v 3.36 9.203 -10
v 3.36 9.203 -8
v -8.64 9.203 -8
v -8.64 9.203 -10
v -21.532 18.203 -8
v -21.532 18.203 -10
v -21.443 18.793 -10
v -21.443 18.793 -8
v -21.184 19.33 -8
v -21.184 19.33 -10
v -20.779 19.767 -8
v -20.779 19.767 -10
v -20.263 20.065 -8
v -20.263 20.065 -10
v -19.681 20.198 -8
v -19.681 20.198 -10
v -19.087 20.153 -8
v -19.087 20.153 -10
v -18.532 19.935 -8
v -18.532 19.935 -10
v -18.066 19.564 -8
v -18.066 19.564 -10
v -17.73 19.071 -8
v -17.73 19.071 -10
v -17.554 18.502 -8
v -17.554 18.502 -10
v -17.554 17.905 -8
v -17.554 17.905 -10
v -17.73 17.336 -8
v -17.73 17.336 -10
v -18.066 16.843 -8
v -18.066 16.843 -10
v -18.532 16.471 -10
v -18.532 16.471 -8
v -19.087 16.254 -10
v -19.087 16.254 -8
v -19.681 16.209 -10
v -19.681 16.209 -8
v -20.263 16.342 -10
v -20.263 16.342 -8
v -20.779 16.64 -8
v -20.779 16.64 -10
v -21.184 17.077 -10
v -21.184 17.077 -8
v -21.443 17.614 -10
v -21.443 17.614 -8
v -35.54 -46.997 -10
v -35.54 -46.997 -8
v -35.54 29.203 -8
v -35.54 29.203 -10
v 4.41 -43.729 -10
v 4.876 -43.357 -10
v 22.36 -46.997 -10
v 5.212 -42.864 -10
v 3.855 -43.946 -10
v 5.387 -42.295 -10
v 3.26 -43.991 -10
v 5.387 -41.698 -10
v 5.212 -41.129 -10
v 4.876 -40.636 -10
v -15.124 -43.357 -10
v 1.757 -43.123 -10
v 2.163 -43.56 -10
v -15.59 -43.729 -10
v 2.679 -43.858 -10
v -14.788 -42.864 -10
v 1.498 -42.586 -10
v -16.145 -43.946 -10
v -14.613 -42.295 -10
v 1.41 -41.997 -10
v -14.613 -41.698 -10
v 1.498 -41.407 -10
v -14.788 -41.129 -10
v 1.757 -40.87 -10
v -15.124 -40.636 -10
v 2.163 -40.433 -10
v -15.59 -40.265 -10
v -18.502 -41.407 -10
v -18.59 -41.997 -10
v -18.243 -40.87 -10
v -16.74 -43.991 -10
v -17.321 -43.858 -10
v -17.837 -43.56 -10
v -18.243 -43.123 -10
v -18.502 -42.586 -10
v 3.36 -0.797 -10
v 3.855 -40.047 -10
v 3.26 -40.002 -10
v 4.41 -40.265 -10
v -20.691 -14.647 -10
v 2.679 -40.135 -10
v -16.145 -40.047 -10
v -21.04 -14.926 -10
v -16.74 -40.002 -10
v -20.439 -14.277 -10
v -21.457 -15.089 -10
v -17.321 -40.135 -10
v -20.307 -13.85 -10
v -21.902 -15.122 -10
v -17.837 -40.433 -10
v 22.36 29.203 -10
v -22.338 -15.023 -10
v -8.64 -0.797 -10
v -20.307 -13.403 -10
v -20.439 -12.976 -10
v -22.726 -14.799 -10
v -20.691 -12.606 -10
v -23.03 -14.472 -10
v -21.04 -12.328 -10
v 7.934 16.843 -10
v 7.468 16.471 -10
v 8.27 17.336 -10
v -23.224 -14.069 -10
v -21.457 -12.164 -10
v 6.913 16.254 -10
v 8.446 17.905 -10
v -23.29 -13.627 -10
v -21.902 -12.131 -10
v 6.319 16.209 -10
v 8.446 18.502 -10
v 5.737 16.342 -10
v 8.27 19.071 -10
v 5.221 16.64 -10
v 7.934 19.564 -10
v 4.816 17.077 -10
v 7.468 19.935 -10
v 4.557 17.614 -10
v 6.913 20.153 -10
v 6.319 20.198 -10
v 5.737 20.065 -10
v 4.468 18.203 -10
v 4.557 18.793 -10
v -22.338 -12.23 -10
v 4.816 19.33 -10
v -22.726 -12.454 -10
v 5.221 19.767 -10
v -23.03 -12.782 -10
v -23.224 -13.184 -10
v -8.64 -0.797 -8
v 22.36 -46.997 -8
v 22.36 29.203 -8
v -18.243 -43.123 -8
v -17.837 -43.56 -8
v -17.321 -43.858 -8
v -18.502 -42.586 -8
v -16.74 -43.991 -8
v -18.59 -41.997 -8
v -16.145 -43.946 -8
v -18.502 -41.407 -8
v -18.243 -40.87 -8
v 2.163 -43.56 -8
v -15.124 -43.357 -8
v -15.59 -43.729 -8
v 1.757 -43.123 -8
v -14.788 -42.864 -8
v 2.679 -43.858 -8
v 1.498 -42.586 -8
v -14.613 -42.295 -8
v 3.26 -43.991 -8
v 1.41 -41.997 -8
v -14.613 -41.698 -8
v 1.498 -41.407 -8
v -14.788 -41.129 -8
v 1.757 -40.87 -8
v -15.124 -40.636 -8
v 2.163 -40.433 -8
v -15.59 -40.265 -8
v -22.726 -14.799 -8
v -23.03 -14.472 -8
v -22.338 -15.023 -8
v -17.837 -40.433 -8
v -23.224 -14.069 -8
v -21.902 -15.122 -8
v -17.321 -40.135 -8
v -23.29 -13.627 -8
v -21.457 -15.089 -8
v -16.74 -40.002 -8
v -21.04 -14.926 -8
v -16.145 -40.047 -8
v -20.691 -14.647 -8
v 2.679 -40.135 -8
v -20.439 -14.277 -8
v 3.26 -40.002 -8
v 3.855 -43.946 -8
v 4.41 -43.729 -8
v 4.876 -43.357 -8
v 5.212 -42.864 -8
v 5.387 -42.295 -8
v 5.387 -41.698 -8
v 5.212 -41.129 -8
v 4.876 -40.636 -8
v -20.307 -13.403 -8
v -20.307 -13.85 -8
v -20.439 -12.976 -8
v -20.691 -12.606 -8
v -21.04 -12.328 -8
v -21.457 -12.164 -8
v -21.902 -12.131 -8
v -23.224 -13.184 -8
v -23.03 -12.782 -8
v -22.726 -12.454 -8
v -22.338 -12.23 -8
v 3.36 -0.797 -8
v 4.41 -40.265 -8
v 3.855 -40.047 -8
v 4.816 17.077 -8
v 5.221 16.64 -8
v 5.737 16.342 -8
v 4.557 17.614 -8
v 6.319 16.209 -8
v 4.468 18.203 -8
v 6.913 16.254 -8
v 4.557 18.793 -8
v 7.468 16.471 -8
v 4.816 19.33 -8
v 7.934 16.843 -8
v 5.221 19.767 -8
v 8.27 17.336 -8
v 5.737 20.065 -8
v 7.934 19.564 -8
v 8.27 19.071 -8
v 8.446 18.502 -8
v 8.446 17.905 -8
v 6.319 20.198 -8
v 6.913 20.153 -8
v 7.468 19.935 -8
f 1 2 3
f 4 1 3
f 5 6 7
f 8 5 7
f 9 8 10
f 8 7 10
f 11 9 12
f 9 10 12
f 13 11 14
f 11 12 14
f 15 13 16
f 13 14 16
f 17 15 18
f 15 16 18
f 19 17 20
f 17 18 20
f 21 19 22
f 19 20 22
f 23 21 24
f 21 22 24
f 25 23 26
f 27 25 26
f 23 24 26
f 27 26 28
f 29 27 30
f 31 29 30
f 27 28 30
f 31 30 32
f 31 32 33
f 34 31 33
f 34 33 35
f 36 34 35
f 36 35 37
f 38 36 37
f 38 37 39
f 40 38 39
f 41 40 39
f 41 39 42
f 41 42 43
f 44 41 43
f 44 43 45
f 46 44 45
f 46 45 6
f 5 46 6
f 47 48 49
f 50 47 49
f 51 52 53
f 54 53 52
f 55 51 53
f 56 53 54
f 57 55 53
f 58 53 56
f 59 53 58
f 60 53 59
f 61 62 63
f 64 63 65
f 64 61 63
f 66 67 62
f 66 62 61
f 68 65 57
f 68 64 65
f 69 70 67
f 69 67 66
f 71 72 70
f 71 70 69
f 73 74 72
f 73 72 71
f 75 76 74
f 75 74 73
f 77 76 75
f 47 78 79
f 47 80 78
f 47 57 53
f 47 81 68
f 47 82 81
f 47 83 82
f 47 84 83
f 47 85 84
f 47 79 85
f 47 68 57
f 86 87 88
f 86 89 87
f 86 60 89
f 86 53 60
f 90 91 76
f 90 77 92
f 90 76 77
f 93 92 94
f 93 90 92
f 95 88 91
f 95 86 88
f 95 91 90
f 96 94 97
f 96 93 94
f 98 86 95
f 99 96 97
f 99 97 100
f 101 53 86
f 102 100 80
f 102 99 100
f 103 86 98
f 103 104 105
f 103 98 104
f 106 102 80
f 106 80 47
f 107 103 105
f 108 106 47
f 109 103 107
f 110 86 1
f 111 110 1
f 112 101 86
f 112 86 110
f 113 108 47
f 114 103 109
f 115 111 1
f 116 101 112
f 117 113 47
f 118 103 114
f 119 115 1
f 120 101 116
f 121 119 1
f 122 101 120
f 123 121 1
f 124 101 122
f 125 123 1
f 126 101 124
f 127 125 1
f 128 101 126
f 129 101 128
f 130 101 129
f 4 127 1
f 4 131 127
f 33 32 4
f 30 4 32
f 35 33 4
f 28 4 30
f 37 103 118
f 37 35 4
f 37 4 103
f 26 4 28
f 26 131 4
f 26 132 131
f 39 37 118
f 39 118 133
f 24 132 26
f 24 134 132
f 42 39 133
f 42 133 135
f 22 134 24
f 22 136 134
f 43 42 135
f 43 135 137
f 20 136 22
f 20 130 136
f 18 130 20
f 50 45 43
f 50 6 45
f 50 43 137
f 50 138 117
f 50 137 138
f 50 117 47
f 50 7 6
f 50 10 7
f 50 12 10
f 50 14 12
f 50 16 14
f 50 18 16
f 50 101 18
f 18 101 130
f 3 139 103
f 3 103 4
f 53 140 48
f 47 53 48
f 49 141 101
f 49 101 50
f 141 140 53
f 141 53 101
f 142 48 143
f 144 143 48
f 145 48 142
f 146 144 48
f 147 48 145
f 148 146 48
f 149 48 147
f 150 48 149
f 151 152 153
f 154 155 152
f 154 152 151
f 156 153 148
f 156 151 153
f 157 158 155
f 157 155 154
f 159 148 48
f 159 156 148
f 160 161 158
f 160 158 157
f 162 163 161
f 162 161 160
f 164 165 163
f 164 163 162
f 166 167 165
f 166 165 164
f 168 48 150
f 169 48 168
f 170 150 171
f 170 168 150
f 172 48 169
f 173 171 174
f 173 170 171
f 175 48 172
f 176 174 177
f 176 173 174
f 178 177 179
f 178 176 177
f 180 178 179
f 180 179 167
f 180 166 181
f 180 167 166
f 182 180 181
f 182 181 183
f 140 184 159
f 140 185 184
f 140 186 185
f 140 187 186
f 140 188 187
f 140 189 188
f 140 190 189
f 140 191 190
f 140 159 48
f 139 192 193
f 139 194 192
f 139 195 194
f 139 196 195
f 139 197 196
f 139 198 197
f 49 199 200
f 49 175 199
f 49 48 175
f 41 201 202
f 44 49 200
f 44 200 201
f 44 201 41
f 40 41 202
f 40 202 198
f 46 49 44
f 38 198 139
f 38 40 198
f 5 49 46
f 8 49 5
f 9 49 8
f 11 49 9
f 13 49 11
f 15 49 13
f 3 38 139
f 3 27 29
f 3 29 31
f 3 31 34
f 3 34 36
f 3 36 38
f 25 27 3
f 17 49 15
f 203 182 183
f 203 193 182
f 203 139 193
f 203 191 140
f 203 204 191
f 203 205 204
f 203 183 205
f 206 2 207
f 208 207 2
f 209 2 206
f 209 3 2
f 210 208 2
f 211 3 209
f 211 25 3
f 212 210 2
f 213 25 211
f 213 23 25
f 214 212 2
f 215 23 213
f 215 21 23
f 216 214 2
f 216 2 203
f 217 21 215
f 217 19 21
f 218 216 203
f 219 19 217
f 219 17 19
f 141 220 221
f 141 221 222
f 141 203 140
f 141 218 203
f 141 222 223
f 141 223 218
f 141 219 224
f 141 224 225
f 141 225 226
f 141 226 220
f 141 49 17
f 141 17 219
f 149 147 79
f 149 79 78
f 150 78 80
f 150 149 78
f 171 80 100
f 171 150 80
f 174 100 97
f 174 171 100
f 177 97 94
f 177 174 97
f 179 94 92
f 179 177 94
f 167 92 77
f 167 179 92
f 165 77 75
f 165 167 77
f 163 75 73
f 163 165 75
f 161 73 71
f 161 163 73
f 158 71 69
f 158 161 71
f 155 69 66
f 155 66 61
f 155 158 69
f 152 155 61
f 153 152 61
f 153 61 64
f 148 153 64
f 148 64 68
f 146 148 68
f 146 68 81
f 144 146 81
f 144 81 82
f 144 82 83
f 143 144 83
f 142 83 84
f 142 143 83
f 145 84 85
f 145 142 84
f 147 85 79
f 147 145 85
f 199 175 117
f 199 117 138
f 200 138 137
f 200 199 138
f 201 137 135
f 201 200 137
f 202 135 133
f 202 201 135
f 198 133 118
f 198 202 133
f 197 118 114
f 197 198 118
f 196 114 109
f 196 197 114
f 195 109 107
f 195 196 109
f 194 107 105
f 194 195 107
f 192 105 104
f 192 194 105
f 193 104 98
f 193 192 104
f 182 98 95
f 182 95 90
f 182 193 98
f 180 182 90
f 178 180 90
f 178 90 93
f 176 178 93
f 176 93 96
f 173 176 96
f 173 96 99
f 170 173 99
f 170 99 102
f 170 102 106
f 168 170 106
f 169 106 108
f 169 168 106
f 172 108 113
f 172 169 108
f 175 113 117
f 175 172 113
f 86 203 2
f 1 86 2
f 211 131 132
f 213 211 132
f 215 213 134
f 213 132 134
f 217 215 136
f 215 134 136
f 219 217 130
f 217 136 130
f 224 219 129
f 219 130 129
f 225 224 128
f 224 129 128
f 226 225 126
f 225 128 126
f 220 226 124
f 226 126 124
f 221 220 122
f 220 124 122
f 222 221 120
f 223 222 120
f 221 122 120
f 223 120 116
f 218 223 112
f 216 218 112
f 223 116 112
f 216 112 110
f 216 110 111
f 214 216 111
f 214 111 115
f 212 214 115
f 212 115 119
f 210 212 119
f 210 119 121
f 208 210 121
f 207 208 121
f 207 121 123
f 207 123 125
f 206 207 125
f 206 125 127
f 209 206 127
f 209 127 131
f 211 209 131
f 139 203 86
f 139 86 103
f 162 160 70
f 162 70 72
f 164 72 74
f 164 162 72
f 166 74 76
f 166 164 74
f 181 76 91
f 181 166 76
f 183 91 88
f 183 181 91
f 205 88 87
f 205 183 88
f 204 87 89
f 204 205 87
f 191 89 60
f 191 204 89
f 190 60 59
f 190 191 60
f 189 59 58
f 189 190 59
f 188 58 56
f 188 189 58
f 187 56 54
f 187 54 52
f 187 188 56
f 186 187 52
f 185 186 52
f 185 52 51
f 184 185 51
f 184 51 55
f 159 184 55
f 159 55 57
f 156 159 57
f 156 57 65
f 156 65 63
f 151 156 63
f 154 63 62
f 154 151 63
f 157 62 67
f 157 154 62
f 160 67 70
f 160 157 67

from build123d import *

# Parameters (mm, degrees)
SKETCH1_W           = 57.9
SKETCH1_H           = 76.2
BOSS_EXTRUDE1_DEPTH = 2
SKETCH2_R           = 2
SKETCH2_W           = 12
SKETCH2_H           = 10
SKETCH2_R_2         = 1.5
CUT_EXTRUDE1_DEPTH  = 2
SKETCH4_R           = 2
SKETCH4_R_2         = 1.5
SKETCH4_R_3         = 1.957178151
BOSS_EXTRUDE5_DEPTH = 2
SKETCH8_W           = 57.9
SKETCH8_H           = 76.2
SKETCH8_R           = 2
SKETCH8_R_2         = 1.5
SKETCH8_W_2         = 12
SKETCH8_H_2         = 10
BOSS_EXTRUDE6_DEPTH = 10
SKETCH9_R           = 2
CUT_EXTRUDE6_DEPTH  = 10
SKETCH10_W          = 57.9
SKETCH10_H          = 76.2
CUT_EXTRUDE7_DEPTH  = 10


with BuildPart() as part:
    # Sketch1 → Boss-Extrude1 (new body)
    with BuildSketch(Plane.XY):
        with Locations((-6.590392234, -8.896581688)):
            Rectangle(SKETCH1_W, SKETCH1_H)
    extrude(amount=BOSS_EXTRUDE1_DEPTH)

    # Sketch2 → Cut-Extrude1 (cut)
    with BuildSketch(Plane(origin=(0, 0, 0), x_dir=(-1, 0, 0), z_dir=(0, 0, -1))):
        with Locations((-6.409607766, 14.203418312)):
            Circle(SKETCH2_R)
        with Locations((19.590392234, 14.203418312)):
            Circle(SKETCH2_R)
        with Locations((2.640392234, 4.203418312)):
            Rectangle(SKETCH2_W, SKETCH2_H)
        with Locations((16.590392234, -41.996581688)):
            Circle(SKETCH2_R)
        with Locations((-3.409607766, -41.996581688)):
            Circle(SKETCH2_R)
        with Locations((21.790392234, -13.626581688)):
            Circle(SKETCH2_R_2)
    extrude(amount=-CUT_EXTRUDE1_DEPTH, mode=Mode.SUBTRACT)

    # Sketch4 → Boss-Extrude5 (add)
    # profile 1 of 3: a face of its own
    with BuildSketch(Plane(origin=(0, 0, 0), x_dir=(-1, 0, 0), z_dir=(0, 0, -1))):
        Polygon((35.540392234, 29.203418312), (6.590392234, 29.203418312), (-22.359607766, 29.203418312), (-22.359607766, -46.996581688), (35.540392234, -46.996581688), align=None)
        with Locations((-3.409607766, -41.996581688)):
            Circle(SKETCH4_R, mode=Mode.SUBTRACT)
        with Locations((16.590392234, -41.996581688)):
            Circle(SKETCH4_R, mode=Mode.SUBTRACT)
        with Locations((21.790392234, -13.626581688)):
            Circle(SKETCH4_R_2, mode=Mode.SUBTRACT)
        Polygon((-13.650237399, 24.487372027), (6.590392234, 24.487372027), (30.150370064, 24.487372027), (30.150370064, 9.203418312), (8.640392234, 9.203418312), (8.640392234, -0.796581688), (-3.359607766, -0.796581688), (-3.359607766, 9.203418312), (-13.650237399, 9.203418312), align=None, mode=Mode.SUBTRACT)
    # profile 2 of 3: a face of its own
    with BuildSketch(Plane(origin=(0, 0, 0), x_dir=(-1, 0, 0), z_dir=(0, 0, -1))):
        with Locations((-6.409607766, 14.203418312)):
            Circle(SKETCH4_R)
    # profile 3 of 3: a face of its own
    with BuildSketch(Plane(origin=(0, 0, 0), x_dir=(-1, 0, 0), z_dir=(0, 0, -1))):
        with Locations((19.590392234, 14.203418312)):
            Circle(SKETCH4_R_3)
    extrude(amount=-BOSS_EXTRUDE5_DEPTH)


with BuildPart() as boss_extrude5_piece_1:
    # of the separate pieces the step leaves, piece 1, a body of its own (boss_extrude5_pieces)
    add(part.part.solids().sort_by_distance((-35.540392234, 29.203418312, 0))[0])



with BuildPart() as boss_extrude5_piece_2:
    # of the separate pieces the step leaves, piece 2, a body of its own (boss_extrude5_pieces)
    add(part.part.solids().sort_by_distance((-21.547570385, 14.203418312, 0))[0])


with BuildPart() as boss_extrude5_piece_1_1:
    add(boss_extrude5_piece_1.part)

    add(boss_extrude5_piece_2.part)  # Boss-Extrude6 merges Boss-Extrude5 piece 2
    # Sketch8 → Boss-Extrude6 (add)
    # profile 1 of 2: a face of its own
    with BuildSketch(Plane(origin=(0, 0, 0), x_dir=(-1, 0, 0), z_dir=(0, 0, -1))):
        with Locations((6.590392234, -8.896581688)):
            Rectangle(SKETCH8_W, SKETCH8_H)
        with Locations((16.590392234, -41.996581688)):
            Circle(SKETCH8_R, mode=Mode.SUBTRACT)
        with Locations((21.790392234, -13.626581688)):
            Circle(SKETCH8_R_2, mode=Mode.SUBTRACT)
        with Locations((19.590392234, 14.203418312)):
            Circle(SKETCH8_R, mode=Mode.SUBTRACT)
        with Locations((-3.409607766, -41.996581688)):
            Circle(SKETCH8_R, mode=Mode.SUBTRACT)
        with Locations((2.640392234, 4.203418312)):
            Rectangle(SKETCH8_W_2, SKETCH8_H_2, mode=Mode.SUBTRACT)
    # profile 2 of 2: a face of its own
    with BuildSketch(Plane(origin=(0, 0, 0), x_dir=(-1, 0, 0), z_dir=(0, 0, -1))):
        with Locations((19.590392234, 14.203418312)):
            Circle(SKETCH8_R)
    extrude(amount=BOSS_EXTRUDE6_DEPTH)

    # Sketch9 → Cut-Extrude6 (cut)
    with BuildSketch(Plane(origin=(0, 0, -10), x_dir=(-1, 0, 0), z_dir=(0, 0, -1))):
        with Locations((-6.468155069, 18.203418312)):
            Circle(SKETCH9_R)
        with Locations((19.531844931, 18.203418312)):
            Circle(SKETCH9_R)
    extrude(amount=-CUT_EXTRUDE6_DEPTH, mode=Mode.SUBTRACT)

    # Sketch10 → Cut-Extrude7 (cut)
    with BuildSketch(Plane.XY.offset(2)):
        with Locations((-6.590392234, -8.896581688)):
            Rectangle(SKETCH10_W, SKETCH10_H)
    extrude(amount=-CUT_EXTRUDE7_DEPTH, mode=Mode.SUBTRACT)


solid = boss_extrude5_piece_1_1.part
